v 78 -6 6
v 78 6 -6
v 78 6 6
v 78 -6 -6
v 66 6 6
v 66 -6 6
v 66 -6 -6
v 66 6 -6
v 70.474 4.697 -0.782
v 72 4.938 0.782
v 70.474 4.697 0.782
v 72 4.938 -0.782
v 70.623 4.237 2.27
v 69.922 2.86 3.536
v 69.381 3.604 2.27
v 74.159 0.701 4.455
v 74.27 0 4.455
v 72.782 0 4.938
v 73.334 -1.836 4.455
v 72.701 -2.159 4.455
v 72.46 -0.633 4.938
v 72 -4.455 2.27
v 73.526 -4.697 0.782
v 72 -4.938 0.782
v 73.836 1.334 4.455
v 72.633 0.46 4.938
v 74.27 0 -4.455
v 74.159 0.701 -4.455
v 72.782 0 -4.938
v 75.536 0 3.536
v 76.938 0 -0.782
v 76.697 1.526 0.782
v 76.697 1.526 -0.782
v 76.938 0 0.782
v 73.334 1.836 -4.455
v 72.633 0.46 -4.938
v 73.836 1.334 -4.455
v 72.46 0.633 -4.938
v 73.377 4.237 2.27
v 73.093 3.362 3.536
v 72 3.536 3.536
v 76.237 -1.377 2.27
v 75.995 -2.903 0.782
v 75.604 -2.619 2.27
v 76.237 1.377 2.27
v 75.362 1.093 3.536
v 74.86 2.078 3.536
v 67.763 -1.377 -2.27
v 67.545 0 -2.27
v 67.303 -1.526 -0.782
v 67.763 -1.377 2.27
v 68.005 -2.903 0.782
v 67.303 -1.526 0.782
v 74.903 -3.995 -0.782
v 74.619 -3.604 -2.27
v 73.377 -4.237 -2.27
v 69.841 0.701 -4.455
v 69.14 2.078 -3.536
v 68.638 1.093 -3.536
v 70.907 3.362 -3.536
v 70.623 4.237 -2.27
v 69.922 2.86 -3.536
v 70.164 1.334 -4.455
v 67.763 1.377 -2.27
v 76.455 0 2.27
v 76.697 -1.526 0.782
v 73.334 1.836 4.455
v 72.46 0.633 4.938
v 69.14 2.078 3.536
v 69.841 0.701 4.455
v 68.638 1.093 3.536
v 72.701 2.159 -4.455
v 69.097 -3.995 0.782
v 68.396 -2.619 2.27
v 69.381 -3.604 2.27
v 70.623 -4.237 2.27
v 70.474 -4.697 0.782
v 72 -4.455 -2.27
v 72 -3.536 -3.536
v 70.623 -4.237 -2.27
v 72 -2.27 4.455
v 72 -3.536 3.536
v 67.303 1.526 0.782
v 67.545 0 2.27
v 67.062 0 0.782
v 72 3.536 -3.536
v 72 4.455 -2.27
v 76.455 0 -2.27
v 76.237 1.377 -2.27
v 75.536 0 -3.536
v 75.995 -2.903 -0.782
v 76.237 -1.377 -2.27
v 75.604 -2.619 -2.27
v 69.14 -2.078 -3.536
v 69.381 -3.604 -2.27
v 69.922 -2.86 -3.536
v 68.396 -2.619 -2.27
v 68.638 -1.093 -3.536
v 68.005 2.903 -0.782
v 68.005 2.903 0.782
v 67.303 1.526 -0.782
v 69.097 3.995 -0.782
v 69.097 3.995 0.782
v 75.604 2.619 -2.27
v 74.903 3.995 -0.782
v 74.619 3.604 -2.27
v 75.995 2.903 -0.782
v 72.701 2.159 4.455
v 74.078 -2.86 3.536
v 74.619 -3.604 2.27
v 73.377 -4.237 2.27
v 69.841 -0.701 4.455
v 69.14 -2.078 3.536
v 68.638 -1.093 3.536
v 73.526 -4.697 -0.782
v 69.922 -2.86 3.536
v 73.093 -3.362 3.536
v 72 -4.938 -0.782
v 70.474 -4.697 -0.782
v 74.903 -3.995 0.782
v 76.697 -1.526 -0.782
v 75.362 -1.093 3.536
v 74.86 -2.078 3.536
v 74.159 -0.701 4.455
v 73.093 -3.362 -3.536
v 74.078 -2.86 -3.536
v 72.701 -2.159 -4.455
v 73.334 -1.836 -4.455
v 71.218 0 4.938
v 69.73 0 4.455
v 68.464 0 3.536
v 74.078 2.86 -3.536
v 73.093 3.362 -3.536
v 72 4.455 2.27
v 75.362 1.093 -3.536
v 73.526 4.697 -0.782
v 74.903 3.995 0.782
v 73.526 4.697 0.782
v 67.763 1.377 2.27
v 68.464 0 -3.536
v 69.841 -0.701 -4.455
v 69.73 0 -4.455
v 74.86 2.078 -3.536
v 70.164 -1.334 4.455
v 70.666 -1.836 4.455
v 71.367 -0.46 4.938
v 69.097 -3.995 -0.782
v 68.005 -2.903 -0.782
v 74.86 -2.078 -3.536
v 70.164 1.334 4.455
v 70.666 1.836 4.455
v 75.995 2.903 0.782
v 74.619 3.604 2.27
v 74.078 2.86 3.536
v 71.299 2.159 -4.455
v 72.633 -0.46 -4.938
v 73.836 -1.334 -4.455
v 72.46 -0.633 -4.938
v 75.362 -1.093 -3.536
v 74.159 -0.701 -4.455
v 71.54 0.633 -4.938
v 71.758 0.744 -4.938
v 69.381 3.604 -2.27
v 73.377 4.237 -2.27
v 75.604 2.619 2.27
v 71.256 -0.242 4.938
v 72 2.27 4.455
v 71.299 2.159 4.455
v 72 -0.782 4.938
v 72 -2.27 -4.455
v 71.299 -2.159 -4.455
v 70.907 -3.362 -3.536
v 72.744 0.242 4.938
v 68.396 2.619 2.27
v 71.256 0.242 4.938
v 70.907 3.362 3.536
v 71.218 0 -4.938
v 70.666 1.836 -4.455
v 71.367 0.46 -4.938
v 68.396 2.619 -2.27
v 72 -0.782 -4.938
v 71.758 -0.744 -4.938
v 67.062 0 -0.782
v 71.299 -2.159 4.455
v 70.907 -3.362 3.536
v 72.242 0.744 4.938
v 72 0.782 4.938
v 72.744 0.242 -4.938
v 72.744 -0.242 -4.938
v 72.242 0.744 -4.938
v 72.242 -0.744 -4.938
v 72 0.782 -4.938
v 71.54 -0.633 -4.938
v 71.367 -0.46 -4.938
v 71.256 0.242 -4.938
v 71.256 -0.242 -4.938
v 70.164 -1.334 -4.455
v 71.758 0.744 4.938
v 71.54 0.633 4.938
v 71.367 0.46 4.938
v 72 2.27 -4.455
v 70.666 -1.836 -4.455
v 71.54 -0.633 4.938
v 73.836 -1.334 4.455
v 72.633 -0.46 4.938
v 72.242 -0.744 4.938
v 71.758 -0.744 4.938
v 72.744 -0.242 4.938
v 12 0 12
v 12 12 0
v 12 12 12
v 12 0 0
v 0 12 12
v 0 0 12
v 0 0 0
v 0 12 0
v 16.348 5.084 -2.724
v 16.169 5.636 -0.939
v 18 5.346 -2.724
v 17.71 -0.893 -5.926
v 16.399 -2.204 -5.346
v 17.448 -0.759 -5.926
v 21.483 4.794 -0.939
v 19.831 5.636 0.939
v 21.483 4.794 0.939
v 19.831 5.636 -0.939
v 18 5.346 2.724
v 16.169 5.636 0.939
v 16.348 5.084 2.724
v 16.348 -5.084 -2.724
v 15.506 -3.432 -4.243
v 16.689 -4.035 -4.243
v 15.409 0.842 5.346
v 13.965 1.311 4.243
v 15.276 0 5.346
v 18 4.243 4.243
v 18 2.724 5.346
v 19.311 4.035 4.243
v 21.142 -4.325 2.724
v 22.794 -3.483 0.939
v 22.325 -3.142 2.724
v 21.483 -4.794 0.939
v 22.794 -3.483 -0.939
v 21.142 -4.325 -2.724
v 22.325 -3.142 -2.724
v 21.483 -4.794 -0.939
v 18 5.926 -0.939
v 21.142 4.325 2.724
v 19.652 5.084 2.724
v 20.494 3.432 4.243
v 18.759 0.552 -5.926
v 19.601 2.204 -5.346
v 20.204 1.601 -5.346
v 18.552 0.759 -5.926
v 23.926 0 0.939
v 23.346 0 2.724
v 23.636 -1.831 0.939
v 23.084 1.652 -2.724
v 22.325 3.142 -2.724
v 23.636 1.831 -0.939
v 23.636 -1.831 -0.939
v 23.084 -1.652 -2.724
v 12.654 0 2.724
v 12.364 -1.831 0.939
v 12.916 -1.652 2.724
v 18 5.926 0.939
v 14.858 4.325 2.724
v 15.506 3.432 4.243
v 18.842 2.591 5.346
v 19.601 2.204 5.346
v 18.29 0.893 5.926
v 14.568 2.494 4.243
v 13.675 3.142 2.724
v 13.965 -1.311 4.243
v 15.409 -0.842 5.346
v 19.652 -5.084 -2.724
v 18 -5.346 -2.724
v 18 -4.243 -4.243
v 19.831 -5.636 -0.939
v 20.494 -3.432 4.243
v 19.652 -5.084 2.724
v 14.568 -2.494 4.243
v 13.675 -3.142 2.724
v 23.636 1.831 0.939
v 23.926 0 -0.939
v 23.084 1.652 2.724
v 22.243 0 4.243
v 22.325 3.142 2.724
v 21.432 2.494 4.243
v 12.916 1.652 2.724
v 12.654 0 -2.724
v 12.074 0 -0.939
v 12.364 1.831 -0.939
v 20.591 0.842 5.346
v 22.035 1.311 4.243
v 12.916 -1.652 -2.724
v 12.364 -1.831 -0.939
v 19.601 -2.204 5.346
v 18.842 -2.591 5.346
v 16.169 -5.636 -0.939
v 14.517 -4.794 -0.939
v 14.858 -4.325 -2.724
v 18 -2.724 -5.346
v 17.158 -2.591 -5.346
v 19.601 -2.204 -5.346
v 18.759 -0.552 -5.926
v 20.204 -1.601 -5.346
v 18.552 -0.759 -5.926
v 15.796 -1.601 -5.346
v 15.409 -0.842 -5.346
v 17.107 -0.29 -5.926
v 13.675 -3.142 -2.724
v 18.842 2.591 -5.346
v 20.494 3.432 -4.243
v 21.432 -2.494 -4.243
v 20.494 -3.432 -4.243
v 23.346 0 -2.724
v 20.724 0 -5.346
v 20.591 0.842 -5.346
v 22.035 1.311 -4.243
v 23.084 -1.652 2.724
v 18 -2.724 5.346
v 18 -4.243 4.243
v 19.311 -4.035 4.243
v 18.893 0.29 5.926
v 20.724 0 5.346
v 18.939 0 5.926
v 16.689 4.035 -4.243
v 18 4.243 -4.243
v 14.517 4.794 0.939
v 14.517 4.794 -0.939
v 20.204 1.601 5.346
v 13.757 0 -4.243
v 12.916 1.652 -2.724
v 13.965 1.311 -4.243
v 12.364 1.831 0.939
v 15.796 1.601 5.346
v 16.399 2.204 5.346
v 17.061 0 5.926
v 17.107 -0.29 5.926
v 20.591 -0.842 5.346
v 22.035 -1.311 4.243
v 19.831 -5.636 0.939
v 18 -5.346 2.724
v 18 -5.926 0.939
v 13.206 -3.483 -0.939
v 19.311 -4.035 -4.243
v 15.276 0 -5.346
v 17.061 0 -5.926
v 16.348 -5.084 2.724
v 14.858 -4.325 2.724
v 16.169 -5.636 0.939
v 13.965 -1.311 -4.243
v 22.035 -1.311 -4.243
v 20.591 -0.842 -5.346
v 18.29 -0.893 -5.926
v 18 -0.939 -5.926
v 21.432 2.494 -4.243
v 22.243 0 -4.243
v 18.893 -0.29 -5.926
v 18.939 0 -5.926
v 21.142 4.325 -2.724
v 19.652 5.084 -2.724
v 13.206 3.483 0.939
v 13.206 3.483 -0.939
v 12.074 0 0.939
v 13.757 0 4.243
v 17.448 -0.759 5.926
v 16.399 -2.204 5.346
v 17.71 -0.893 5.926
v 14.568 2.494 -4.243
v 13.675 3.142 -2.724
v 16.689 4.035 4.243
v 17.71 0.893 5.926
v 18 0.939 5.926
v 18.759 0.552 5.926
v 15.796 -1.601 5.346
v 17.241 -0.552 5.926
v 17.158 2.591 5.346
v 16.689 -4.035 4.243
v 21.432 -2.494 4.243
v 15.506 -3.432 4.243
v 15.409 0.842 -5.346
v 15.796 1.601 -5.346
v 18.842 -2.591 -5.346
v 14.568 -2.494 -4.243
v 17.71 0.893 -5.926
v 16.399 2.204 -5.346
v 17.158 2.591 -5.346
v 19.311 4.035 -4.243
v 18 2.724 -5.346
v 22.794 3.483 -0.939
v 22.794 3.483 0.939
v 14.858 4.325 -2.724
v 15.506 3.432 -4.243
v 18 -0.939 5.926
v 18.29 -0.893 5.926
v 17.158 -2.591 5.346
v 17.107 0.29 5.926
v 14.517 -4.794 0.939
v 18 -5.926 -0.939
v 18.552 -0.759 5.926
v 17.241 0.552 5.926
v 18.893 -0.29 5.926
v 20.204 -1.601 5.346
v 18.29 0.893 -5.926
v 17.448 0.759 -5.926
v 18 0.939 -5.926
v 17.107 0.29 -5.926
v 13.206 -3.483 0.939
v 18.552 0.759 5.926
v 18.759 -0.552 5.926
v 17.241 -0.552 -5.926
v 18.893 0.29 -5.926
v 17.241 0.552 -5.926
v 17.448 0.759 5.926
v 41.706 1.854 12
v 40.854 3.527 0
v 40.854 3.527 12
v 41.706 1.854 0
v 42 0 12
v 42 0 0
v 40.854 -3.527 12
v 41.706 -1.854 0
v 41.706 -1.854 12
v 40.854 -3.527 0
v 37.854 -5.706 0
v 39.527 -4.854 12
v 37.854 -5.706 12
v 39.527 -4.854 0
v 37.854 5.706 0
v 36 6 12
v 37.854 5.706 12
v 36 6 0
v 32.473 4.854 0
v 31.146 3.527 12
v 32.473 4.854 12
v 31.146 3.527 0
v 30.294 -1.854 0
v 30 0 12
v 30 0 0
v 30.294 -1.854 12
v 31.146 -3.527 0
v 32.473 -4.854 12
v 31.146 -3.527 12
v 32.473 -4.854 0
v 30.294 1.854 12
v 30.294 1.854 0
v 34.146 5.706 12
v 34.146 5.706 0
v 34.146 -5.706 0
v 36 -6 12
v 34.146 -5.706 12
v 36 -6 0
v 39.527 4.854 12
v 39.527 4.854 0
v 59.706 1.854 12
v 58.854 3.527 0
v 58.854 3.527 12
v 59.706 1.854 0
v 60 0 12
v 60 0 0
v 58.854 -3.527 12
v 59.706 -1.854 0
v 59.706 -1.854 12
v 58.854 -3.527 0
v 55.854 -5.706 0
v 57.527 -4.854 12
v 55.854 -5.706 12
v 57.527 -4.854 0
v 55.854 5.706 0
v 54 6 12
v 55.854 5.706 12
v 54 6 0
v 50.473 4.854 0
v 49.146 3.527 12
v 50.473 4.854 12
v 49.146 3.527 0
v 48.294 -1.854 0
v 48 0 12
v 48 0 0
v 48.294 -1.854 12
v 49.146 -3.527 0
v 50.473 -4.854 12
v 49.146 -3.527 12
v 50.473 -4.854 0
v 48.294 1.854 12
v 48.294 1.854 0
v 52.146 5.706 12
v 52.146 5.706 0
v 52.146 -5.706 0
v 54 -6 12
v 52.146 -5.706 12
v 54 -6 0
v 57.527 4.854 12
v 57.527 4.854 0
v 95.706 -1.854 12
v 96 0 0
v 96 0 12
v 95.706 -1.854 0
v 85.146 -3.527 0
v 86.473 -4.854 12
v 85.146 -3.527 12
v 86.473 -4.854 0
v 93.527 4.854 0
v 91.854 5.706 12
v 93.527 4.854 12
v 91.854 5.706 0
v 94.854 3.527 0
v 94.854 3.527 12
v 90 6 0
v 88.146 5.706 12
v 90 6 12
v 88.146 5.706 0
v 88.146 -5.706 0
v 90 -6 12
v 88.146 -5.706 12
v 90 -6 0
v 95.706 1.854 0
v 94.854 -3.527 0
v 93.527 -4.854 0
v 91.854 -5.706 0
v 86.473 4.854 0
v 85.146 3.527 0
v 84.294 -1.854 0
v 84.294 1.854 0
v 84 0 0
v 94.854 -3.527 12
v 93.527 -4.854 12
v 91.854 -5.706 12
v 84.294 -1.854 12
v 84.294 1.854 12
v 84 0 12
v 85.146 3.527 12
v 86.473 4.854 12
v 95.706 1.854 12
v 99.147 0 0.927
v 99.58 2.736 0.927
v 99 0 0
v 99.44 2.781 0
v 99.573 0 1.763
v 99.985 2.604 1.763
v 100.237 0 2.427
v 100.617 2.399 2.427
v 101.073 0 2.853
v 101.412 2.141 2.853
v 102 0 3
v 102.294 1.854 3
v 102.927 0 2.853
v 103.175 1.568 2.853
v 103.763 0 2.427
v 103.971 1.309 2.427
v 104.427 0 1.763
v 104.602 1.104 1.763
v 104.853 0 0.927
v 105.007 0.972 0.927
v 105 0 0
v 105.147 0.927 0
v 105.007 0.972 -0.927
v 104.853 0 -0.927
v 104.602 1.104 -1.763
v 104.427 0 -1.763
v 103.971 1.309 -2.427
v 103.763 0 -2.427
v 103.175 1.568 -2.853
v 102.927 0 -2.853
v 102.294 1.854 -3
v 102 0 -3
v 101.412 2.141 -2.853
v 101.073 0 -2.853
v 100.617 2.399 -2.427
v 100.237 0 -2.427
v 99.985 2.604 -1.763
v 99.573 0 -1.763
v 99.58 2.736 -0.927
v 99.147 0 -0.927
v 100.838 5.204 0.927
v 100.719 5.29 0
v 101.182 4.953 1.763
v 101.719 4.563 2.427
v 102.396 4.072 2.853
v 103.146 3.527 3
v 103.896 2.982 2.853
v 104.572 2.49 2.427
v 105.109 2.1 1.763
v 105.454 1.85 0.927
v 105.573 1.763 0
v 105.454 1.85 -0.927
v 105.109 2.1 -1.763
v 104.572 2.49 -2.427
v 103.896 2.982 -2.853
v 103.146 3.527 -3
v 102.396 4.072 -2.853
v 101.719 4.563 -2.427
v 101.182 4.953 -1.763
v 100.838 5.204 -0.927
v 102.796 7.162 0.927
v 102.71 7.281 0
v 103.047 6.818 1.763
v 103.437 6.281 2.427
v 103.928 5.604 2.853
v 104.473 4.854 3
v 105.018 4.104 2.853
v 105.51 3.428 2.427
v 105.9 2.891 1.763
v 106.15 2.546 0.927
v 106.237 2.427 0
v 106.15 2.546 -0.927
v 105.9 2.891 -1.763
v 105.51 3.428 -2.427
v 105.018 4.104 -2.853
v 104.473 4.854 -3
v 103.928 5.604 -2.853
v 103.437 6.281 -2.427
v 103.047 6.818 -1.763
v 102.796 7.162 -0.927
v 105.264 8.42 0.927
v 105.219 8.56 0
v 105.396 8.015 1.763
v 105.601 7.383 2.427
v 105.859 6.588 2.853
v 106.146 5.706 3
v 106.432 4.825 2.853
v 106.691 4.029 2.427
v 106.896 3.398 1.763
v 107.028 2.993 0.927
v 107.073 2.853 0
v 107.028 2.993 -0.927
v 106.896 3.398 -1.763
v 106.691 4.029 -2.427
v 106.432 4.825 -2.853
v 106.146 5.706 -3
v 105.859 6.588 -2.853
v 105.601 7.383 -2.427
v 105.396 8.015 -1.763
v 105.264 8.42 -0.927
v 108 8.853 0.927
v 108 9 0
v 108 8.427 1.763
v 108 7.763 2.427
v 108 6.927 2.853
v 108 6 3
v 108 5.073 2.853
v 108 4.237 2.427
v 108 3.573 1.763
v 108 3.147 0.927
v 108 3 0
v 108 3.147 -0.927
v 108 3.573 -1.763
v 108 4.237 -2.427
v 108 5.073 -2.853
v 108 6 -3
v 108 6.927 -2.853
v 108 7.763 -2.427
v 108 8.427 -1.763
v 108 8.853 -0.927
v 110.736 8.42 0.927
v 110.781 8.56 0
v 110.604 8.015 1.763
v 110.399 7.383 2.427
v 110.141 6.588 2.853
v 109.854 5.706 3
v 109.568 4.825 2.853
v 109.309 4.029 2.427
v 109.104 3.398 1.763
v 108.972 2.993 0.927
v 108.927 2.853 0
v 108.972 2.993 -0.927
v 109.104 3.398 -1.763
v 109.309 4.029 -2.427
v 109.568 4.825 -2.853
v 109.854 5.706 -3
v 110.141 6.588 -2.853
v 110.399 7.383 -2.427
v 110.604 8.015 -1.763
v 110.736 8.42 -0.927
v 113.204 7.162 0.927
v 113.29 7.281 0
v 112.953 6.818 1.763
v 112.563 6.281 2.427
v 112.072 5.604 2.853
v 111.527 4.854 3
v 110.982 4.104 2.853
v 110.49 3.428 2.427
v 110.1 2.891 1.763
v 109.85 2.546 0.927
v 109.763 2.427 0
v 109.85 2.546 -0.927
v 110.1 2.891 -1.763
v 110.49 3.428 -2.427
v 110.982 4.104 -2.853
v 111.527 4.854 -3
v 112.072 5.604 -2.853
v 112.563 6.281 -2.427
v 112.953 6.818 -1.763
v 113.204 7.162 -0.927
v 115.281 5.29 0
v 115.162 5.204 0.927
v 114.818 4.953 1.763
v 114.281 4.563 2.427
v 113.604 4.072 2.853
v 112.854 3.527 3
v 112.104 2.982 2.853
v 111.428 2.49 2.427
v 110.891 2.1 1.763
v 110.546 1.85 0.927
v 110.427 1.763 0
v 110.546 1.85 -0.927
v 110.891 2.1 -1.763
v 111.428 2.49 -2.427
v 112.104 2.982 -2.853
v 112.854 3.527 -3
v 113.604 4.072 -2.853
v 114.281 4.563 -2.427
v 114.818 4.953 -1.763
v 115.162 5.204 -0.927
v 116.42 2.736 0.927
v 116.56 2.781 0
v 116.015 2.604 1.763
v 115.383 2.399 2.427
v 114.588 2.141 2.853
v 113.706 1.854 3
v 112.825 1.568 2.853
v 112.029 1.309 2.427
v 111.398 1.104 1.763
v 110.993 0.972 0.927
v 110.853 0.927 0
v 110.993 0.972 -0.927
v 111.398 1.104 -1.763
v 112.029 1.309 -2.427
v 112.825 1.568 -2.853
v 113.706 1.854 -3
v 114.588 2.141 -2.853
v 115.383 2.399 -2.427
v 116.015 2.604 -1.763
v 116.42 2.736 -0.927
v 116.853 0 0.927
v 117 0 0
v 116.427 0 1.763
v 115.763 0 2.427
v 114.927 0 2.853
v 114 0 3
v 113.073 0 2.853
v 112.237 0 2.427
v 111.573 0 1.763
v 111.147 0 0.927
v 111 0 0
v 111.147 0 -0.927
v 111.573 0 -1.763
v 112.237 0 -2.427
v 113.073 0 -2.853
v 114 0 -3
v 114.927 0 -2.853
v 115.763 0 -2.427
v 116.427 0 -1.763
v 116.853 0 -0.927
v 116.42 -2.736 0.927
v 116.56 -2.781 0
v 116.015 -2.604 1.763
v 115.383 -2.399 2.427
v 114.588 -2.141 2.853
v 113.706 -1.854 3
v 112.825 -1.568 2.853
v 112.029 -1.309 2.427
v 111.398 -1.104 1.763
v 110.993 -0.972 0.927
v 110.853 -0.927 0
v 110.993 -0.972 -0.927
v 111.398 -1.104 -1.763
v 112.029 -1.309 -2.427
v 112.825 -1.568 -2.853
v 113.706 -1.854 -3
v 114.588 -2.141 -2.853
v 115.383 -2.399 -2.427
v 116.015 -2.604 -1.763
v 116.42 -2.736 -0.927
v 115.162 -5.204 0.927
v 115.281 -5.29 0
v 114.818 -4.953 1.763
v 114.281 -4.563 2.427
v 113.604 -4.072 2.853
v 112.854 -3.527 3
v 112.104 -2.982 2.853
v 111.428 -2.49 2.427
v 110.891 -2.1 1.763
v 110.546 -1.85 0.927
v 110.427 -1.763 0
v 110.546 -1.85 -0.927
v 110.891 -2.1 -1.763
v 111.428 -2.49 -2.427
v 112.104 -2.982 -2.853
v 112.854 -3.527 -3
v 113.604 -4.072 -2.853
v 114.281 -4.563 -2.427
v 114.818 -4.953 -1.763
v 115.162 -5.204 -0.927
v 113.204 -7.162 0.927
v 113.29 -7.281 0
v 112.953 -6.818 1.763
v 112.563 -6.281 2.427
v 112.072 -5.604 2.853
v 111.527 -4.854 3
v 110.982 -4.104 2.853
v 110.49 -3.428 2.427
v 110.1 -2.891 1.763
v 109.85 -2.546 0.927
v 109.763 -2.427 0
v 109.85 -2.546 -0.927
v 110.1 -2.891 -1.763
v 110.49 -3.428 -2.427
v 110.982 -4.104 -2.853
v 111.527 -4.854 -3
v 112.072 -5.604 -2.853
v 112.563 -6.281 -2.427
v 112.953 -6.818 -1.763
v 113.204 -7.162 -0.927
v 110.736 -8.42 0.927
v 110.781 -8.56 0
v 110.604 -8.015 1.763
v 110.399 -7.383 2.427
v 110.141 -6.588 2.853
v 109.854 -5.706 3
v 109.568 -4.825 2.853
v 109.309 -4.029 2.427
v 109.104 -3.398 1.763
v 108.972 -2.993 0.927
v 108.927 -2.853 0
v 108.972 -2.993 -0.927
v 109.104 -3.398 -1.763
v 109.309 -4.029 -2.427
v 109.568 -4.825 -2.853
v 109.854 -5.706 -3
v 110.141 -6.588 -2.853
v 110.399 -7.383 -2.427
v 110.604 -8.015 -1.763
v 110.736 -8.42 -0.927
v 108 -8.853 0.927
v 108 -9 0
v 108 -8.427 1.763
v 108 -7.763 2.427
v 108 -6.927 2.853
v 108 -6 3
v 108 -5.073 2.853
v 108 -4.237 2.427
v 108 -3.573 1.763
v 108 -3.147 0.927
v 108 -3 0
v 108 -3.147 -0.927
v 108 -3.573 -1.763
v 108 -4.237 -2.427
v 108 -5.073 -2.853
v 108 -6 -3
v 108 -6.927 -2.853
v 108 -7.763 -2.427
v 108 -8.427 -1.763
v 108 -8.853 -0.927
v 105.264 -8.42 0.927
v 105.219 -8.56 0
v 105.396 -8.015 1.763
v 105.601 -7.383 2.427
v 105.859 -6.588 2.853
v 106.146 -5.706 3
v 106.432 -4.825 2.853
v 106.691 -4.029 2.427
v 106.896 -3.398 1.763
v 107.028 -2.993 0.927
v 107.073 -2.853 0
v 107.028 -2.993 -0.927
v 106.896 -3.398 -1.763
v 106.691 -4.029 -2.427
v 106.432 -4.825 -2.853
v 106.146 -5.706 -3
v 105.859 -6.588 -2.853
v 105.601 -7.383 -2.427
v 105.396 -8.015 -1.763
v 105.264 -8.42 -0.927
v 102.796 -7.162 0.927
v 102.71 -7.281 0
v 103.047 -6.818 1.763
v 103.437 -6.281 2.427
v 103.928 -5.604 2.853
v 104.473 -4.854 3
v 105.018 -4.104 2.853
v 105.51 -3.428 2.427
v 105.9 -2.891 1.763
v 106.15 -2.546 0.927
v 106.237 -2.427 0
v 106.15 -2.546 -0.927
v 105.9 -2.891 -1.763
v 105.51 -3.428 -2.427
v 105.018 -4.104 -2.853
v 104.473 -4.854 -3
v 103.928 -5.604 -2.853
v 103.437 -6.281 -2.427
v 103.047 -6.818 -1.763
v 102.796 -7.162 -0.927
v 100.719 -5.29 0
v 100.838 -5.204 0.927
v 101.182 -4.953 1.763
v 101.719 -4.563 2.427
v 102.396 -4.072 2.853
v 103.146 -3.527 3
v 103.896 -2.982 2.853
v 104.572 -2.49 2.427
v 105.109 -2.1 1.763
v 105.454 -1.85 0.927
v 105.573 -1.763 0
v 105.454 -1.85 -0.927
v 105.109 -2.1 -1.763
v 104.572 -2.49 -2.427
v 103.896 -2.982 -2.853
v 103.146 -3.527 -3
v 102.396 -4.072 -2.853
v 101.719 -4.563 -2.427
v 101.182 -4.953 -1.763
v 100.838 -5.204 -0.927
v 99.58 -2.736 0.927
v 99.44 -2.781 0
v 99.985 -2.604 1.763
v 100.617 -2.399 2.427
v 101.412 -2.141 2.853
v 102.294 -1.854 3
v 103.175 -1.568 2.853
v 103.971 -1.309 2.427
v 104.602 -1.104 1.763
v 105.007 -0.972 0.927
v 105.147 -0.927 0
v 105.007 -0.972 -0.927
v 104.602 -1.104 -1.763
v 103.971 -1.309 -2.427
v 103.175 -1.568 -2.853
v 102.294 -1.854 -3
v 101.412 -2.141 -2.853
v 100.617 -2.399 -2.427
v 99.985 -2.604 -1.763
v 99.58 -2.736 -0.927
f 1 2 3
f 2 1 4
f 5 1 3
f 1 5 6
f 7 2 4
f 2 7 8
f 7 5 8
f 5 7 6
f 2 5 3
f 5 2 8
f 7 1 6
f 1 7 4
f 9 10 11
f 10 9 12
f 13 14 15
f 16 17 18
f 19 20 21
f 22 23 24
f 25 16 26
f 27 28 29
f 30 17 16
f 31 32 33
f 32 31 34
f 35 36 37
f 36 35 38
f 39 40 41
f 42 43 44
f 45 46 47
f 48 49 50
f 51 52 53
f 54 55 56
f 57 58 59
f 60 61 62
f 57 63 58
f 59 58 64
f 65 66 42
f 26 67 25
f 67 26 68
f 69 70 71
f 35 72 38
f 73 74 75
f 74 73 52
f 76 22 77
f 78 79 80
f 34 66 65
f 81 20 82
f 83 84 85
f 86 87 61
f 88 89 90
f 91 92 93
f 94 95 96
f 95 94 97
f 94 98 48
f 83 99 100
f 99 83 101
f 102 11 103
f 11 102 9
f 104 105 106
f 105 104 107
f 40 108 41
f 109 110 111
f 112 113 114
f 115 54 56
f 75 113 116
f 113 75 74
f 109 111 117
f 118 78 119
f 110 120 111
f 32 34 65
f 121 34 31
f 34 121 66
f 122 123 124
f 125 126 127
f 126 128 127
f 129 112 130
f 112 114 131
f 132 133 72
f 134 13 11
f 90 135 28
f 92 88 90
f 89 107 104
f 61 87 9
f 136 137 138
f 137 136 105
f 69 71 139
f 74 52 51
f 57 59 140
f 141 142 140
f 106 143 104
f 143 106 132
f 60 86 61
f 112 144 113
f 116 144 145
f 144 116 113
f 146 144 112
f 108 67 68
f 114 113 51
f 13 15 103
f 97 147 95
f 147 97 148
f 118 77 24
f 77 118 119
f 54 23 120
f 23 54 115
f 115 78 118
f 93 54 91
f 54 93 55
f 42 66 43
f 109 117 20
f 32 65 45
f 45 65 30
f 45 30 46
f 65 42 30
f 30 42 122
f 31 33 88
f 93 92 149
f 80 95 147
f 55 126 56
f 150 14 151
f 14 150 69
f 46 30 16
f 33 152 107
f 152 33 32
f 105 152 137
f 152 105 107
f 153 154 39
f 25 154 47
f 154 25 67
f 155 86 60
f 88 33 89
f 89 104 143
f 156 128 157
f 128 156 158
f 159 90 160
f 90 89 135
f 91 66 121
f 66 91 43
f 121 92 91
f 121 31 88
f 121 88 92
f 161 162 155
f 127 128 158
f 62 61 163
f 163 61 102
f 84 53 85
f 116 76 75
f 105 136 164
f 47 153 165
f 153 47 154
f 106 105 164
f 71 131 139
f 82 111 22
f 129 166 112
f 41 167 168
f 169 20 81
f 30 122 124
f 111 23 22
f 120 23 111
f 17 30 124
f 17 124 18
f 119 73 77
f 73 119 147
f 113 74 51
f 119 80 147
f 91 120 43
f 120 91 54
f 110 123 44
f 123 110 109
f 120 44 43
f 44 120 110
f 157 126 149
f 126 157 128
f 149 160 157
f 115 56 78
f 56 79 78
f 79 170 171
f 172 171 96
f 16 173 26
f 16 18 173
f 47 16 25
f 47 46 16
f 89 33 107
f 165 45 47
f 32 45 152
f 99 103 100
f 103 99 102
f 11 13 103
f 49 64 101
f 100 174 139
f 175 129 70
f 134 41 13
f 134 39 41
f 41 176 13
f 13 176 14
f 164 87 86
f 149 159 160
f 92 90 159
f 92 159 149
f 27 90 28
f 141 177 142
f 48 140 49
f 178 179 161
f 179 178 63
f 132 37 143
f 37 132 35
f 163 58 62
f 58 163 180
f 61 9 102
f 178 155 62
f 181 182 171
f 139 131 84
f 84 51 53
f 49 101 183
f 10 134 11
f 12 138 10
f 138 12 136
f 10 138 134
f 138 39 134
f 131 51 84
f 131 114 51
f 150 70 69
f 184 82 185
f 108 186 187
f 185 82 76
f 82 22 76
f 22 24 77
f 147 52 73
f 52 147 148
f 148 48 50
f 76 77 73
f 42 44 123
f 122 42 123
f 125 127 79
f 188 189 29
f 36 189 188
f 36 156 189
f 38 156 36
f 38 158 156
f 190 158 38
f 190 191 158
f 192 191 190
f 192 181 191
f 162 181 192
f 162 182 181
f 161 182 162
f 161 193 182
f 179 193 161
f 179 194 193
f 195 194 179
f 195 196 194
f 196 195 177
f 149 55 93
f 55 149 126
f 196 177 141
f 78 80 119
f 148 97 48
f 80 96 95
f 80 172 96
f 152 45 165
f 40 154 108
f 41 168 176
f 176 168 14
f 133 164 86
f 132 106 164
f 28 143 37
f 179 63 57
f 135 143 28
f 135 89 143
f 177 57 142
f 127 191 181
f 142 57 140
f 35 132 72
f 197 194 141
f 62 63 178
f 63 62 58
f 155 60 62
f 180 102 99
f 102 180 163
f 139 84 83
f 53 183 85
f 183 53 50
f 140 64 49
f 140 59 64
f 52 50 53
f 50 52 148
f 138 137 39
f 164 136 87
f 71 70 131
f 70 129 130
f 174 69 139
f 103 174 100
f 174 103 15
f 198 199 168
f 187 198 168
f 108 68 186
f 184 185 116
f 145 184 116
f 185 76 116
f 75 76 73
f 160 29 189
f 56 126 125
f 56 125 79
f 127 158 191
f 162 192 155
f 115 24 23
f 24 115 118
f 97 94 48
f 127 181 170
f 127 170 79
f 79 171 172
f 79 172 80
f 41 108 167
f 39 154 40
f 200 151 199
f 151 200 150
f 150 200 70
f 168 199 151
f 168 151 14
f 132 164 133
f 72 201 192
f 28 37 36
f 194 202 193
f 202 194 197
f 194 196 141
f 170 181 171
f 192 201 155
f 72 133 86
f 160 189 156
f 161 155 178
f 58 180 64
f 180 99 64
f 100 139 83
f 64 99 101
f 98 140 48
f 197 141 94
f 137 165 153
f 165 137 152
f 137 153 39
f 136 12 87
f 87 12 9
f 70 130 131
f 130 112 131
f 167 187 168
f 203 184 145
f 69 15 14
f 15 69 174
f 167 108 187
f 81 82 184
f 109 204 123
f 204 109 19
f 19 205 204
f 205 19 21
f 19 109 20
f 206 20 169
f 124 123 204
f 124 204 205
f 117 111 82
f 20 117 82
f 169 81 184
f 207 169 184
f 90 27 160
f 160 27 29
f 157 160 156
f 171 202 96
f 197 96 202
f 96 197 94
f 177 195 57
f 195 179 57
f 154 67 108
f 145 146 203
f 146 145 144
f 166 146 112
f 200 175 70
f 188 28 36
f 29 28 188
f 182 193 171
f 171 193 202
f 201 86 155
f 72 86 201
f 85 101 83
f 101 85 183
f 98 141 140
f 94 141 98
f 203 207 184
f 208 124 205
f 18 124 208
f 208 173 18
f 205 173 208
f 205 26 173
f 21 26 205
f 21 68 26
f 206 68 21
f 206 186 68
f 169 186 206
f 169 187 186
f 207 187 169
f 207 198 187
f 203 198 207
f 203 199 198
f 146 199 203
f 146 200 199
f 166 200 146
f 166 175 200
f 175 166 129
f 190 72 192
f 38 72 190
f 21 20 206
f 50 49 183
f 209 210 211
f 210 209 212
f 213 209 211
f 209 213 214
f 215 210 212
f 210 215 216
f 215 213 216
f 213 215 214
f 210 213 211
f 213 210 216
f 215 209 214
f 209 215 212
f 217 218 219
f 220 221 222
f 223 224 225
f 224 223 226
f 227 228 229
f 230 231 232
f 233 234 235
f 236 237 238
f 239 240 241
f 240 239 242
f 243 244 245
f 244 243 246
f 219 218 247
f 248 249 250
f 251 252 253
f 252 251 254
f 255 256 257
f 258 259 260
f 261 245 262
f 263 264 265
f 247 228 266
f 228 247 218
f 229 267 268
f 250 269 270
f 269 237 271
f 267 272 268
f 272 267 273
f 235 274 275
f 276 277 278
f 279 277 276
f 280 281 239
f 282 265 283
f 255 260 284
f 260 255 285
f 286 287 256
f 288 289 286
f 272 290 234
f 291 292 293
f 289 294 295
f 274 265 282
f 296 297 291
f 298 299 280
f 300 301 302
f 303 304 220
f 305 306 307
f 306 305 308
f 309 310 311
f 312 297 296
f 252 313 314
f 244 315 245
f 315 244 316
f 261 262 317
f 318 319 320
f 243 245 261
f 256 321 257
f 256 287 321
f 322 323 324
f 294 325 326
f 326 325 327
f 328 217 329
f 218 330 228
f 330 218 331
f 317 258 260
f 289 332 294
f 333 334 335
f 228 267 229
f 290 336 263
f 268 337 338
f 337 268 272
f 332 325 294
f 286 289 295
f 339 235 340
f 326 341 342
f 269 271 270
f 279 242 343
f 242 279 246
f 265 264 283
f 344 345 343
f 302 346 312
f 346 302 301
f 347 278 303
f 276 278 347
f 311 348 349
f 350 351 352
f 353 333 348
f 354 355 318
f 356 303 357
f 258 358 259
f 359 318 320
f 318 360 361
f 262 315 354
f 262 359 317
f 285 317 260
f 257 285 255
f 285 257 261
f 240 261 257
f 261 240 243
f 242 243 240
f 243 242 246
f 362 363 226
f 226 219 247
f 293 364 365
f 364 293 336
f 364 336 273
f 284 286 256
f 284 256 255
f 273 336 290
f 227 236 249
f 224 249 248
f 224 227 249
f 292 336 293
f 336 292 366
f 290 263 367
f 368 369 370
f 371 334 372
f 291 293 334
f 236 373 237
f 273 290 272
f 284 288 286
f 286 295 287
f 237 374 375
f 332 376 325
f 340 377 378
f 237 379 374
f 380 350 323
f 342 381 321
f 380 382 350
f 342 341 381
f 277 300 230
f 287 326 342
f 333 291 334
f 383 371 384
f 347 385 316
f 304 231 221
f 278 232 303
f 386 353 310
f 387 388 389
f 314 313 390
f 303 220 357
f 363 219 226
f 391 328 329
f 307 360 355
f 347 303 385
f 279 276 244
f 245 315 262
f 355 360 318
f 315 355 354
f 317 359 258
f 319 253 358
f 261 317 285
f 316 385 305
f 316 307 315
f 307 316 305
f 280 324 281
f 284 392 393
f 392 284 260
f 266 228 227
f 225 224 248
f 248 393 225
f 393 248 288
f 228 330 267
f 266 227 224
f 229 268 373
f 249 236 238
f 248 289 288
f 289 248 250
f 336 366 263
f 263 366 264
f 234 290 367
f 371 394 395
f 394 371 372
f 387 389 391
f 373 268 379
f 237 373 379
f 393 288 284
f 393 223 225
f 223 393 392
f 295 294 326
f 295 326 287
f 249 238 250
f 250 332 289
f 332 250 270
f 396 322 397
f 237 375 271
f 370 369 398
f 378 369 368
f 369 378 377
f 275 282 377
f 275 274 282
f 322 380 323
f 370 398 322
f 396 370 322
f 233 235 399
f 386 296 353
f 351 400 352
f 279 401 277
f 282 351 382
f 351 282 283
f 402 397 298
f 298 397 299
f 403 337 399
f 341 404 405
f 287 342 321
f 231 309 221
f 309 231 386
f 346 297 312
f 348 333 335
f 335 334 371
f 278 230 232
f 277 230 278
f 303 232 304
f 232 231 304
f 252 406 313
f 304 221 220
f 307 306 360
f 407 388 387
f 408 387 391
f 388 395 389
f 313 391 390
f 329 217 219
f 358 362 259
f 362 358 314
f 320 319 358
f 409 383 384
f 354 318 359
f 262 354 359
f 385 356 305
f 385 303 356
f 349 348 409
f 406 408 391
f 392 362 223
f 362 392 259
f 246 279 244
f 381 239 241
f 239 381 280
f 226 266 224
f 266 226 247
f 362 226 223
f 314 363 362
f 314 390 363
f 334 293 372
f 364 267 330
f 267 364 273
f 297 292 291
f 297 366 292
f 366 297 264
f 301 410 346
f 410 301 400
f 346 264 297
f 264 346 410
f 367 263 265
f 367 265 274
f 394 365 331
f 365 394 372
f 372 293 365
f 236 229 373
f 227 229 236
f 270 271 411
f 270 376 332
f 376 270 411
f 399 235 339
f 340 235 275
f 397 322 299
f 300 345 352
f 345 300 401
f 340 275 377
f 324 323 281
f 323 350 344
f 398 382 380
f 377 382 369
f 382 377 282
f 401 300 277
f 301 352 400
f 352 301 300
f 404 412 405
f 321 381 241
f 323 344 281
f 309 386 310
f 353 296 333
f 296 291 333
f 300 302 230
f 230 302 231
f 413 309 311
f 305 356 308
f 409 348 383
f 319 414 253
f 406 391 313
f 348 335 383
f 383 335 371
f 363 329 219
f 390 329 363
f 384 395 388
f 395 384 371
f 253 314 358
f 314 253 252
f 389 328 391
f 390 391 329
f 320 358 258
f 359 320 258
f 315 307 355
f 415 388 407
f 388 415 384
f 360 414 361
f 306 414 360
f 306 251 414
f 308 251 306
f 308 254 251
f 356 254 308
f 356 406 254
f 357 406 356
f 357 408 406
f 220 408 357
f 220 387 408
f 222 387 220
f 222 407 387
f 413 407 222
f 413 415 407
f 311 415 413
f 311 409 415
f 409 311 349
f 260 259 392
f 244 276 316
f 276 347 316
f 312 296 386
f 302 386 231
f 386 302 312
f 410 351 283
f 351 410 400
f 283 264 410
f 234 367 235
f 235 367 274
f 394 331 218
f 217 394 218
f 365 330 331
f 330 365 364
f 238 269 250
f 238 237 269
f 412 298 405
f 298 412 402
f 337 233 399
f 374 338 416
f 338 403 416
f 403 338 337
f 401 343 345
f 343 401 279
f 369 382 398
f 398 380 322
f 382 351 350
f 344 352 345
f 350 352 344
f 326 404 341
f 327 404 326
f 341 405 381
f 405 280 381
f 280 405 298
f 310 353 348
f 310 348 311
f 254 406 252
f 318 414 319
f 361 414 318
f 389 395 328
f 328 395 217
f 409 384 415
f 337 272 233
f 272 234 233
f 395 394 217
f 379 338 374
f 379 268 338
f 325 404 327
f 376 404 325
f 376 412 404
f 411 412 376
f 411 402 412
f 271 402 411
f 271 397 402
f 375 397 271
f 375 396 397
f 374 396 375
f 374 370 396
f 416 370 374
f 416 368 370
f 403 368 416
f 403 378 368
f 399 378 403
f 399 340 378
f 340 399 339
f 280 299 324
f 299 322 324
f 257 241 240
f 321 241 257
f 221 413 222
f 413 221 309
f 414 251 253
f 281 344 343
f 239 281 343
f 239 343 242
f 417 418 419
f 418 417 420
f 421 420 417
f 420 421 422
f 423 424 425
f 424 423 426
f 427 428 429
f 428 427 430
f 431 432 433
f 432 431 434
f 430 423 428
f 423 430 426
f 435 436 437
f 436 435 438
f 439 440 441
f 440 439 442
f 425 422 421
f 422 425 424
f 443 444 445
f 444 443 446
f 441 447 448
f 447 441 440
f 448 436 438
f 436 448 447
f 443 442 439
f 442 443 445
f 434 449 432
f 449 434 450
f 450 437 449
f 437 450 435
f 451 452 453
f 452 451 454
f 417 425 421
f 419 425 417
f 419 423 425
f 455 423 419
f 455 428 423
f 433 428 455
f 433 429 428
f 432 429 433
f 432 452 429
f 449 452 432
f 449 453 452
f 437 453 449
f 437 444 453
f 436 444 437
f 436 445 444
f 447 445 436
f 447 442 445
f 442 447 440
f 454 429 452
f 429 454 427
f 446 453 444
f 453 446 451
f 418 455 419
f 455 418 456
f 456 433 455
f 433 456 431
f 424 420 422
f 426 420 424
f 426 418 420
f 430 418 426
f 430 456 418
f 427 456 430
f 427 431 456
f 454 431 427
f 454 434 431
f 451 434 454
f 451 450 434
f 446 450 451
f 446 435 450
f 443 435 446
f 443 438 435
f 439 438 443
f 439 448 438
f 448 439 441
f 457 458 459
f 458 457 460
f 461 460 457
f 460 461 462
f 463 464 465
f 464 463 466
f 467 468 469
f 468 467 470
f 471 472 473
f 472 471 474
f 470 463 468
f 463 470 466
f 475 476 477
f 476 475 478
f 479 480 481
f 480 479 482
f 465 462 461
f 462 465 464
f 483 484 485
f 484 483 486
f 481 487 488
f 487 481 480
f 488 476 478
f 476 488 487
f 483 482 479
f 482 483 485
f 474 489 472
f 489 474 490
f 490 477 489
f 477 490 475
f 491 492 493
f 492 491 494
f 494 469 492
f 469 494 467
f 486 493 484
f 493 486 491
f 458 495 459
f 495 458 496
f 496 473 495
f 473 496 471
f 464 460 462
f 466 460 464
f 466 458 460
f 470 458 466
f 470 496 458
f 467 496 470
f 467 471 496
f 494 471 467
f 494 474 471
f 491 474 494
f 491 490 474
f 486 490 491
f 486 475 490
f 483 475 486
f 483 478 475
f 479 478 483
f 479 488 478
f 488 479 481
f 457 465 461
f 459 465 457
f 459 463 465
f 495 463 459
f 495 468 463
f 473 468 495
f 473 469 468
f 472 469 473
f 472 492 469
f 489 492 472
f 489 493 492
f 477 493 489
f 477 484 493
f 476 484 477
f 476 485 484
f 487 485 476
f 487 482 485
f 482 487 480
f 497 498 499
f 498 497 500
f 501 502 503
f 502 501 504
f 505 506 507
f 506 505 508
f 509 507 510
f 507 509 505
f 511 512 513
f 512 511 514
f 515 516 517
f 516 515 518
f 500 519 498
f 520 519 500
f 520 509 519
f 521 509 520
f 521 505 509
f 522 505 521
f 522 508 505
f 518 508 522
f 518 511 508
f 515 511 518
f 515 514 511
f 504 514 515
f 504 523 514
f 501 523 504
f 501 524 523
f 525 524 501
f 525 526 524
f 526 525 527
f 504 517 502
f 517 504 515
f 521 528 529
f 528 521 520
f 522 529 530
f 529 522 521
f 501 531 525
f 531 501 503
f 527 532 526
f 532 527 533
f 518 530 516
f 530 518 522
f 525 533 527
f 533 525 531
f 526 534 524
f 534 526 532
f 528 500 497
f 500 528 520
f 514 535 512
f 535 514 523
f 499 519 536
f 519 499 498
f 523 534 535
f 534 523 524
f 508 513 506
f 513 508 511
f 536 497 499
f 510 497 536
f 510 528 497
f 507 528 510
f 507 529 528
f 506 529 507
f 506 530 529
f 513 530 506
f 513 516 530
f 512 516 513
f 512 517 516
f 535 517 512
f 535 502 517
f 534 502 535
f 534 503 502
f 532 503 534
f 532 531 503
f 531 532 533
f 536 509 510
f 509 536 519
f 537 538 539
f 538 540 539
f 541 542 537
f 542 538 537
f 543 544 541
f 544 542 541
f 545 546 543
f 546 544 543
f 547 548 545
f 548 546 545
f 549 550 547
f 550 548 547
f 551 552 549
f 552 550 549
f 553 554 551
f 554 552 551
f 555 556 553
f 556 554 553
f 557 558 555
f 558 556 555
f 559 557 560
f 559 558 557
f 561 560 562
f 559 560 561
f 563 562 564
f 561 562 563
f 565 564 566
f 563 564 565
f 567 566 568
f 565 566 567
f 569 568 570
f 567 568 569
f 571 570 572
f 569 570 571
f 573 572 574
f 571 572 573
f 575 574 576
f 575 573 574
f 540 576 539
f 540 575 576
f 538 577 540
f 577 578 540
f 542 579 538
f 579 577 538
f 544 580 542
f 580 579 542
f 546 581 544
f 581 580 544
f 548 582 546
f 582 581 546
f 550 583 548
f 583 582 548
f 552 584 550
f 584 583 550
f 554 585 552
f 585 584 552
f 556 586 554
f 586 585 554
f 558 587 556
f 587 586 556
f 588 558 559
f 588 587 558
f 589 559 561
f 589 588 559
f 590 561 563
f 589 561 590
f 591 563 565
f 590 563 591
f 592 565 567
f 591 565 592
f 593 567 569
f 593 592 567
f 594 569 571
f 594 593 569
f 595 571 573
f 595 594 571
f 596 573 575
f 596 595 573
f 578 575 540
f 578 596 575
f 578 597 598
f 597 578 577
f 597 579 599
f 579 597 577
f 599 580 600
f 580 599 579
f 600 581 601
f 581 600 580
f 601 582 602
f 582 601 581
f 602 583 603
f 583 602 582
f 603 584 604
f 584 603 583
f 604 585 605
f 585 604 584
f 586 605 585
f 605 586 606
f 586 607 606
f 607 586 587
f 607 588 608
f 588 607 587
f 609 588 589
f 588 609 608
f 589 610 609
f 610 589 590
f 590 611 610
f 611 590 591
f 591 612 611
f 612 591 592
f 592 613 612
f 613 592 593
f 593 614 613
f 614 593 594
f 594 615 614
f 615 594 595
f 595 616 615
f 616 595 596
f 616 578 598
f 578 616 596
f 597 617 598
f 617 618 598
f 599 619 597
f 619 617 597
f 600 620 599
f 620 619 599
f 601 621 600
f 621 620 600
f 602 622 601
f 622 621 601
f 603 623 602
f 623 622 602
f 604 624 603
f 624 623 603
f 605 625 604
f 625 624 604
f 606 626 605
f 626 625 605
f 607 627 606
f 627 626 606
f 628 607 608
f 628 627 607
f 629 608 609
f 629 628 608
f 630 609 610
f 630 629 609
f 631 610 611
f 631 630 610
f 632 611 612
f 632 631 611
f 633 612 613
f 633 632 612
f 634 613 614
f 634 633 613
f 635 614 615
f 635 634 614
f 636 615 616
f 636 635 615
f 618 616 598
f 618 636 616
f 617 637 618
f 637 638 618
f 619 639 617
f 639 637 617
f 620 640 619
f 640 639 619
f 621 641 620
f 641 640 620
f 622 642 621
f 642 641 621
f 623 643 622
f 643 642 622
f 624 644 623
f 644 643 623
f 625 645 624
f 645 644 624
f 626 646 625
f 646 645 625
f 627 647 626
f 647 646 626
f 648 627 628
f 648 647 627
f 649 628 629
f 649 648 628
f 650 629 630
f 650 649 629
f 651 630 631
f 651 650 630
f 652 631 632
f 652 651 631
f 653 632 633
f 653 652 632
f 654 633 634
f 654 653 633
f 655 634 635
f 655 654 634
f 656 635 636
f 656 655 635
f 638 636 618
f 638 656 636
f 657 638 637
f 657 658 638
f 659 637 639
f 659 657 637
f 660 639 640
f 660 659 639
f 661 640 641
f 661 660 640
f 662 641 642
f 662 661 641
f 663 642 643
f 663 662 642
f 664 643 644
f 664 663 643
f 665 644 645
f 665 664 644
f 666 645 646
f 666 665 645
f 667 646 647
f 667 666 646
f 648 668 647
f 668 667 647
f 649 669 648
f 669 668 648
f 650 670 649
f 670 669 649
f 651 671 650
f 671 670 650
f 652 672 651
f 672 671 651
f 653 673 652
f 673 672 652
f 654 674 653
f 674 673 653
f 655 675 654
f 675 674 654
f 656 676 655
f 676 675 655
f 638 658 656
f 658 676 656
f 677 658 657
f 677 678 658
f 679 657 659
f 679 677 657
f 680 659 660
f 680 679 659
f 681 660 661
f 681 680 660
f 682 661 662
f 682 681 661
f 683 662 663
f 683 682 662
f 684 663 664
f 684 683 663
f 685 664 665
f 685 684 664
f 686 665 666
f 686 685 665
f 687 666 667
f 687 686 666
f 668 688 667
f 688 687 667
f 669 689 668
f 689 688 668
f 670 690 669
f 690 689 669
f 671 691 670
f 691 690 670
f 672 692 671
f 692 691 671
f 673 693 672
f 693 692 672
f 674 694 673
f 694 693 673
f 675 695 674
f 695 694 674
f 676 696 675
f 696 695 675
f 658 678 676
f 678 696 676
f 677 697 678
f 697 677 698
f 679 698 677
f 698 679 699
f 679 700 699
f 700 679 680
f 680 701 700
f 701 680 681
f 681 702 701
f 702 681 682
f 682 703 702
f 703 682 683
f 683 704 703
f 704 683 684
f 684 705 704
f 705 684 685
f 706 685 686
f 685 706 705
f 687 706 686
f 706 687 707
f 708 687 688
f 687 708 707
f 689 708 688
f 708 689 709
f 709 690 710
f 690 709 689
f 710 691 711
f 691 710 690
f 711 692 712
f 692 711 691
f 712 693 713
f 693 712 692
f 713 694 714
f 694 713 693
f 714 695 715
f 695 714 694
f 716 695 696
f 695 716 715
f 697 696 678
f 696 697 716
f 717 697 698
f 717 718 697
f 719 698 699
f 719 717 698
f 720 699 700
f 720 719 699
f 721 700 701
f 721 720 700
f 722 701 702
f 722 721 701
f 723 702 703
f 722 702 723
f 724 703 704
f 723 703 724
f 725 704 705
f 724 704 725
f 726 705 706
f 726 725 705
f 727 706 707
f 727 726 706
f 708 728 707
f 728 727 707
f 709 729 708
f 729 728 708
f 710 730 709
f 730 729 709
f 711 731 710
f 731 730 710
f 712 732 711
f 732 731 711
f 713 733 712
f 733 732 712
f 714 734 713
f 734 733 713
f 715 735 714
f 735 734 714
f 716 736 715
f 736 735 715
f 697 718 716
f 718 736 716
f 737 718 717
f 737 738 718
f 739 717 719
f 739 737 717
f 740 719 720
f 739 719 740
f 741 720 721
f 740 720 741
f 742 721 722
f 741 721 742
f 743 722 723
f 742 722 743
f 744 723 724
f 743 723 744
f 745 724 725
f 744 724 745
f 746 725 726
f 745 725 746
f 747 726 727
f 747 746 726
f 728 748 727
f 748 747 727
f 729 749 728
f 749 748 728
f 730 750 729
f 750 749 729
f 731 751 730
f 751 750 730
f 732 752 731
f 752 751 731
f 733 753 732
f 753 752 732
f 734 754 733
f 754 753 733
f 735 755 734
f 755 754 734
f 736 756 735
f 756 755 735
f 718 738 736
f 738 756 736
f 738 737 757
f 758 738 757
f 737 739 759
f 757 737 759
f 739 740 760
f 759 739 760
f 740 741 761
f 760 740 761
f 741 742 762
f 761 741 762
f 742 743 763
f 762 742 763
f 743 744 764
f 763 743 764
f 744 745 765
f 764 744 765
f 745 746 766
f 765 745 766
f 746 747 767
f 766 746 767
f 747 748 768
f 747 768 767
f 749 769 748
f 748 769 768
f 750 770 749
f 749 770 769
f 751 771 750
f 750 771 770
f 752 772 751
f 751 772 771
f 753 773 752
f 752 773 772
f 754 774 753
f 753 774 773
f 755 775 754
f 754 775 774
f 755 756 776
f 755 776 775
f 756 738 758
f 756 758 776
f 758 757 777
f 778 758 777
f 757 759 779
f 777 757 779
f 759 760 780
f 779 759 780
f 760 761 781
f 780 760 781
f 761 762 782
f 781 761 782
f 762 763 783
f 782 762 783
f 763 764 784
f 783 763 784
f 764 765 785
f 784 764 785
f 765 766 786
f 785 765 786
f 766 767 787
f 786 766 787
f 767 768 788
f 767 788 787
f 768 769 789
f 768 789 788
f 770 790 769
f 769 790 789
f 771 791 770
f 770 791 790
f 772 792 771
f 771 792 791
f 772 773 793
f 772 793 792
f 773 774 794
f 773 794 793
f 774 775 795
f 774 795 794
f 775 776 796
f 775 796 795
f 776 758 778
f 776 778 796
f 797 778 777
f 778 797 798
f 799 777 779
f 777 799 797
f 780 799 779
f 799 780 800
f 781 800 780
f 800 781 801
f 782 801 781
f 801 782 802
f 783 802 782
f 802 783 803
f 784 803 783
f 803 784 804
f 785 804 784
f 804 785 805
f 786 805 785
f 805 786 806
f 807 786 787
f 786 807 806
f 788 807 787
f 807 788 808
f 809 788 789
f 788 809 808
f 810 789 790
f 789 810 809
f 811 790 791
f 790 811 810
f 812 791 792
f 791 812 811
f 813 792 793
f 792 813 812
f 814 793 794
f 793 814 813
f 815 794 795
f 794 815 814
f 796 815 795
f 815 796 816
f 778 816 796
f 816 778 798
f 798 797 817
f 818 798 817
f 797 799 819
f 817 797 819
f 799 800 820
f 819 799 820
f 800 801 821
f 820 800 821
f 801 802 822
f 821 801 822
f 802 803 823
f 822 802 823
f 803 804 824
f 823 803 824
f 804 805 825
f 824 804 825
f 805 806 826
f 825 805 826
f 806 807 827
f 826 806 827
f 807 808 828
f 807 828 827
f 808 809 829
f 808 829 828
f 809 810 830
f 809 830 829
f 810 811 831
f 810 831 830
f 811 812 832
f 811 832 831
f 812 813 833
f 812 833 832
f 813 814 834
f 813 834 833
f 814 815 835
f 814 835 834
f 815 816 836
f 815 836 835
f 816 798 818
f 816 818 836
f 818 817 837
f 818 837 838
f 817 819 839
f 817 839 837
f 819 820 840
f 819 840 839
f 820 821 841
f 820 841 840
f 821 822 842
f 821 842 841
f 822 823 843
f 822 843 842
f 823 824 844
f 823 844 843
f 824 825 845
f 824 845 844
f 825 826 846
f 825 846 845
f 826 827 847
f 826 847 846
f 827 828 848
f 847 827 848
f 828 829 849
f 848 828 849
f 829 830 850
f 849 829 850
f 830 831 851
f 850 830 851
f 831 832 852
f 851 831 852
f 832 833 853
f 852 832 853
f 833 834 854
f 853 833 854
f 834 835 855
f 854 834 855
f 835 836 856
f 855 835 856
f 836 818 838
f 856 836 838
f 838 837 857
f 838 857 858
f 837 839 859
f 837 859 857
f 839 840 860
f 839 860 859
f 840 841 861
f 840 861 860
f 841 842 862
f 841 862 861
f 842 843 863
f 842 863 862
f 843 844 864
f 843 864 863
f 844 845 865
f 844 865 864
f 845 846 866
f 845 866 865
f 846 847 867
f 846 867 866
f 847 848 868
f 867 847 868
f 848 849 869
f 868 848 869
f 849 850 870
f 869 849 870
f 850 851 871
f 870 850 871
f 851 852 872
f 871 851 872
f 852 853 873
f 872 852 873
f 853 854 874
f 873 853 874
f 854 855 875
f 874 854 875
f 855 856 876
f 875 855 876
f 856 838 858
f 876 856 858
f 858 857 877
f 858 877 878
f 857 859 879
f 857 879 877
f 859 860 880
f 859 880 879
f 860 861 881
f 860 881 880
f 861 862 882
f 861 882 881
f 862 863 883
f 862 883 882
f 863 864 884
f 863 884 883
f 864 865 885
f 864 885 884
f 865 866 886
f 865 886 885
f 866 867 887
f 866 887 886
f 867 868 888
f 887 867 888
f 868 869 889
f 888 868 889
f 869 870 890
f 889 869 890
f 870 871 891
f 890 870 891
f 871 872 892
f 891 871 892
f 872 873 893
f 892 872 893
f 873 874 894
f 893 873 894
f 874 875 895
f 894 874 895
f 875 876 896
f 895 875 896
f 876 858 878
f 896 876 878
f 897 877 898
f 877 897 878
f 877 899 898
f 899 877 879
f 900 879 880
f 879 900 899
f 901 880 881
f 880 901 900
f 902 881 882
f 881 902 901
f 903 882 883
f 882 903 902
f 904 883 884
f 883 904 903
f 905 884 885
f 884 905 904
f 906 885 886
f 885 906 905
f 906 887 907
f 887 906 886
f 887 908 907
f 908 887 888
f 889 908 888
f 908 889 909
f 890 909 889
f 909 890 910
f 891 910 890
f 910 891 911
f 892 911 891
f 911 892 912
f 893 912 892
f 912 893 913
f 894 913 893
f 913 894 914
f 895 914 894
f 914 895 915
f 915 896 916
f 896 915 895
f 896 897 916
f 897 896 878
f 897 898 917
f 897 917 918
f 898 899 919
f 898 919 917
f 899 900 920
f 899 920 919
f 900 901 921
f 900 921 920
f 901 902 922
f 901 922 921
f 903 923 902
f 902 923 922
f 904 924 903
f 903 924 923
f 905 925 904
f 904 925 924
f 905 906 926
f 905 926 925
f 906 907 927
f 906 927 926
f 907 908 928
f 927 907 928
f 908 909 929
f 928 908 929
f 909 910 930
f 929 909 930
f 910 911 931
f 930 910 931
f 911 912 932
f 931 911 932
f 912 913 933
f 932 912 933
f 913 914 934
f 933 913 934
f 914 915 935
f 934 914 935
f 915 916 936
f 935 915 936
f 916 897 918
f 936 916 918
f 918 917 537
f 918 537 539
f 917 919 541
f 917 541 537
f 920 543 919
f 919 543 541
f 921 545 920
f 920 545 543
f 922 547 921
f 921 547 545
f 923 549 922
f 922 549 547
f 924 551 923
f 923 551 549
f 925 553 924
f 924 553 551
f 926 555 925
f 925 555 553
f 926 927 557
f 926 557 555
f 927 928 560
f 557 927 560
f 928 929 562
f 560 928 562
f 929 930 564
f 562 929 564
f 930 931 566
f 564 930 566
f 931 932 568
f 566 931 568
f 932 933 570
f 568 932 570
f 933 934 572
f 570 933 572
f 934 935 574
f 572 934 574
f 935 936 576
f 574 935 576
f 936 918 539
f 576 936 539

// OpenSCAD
// TEST 15: Round-trip fidelity
// Load this file, then copy the generated code and load it again.
// Expected: both loads produce identical trees and meshes.
// Tests: all main node types in one scene.

$fn = 20;

size = 12;
gap  = 18;

// cube
translate([0, 0, 0]) {
    cube([size, size, size]);
}

// sphere
translate([gap, 0, 0]) {
    sphere(r=size/2);
}

// cylinder r
translate([gap*2, 0, 0]) {
    cylinder(h=size, r=size/2);
}

// cylinder d — round-trip must keep d=
translate([gap*3, 0, 0]) {
    cylinder(h=size, d=size);
}

// difference
translate([gap*4, 0, 0]) {
    difference() {
        cube([size, size, size], center=true);
        sphere(r=size/2 - 1);
    }
}

// linear_extrude circle
translate([gap*5, 0, 0]) {
    linear_extrude(height=size) {
        circle(r=size/2);
    }
}

// rotate_extrude
translate([gap*6, 0, 0]) {
    rotate_extrude(angle=360) {
        translate([size/2, 0, 0]) {
            circle(r=3);
        }
    }
}
